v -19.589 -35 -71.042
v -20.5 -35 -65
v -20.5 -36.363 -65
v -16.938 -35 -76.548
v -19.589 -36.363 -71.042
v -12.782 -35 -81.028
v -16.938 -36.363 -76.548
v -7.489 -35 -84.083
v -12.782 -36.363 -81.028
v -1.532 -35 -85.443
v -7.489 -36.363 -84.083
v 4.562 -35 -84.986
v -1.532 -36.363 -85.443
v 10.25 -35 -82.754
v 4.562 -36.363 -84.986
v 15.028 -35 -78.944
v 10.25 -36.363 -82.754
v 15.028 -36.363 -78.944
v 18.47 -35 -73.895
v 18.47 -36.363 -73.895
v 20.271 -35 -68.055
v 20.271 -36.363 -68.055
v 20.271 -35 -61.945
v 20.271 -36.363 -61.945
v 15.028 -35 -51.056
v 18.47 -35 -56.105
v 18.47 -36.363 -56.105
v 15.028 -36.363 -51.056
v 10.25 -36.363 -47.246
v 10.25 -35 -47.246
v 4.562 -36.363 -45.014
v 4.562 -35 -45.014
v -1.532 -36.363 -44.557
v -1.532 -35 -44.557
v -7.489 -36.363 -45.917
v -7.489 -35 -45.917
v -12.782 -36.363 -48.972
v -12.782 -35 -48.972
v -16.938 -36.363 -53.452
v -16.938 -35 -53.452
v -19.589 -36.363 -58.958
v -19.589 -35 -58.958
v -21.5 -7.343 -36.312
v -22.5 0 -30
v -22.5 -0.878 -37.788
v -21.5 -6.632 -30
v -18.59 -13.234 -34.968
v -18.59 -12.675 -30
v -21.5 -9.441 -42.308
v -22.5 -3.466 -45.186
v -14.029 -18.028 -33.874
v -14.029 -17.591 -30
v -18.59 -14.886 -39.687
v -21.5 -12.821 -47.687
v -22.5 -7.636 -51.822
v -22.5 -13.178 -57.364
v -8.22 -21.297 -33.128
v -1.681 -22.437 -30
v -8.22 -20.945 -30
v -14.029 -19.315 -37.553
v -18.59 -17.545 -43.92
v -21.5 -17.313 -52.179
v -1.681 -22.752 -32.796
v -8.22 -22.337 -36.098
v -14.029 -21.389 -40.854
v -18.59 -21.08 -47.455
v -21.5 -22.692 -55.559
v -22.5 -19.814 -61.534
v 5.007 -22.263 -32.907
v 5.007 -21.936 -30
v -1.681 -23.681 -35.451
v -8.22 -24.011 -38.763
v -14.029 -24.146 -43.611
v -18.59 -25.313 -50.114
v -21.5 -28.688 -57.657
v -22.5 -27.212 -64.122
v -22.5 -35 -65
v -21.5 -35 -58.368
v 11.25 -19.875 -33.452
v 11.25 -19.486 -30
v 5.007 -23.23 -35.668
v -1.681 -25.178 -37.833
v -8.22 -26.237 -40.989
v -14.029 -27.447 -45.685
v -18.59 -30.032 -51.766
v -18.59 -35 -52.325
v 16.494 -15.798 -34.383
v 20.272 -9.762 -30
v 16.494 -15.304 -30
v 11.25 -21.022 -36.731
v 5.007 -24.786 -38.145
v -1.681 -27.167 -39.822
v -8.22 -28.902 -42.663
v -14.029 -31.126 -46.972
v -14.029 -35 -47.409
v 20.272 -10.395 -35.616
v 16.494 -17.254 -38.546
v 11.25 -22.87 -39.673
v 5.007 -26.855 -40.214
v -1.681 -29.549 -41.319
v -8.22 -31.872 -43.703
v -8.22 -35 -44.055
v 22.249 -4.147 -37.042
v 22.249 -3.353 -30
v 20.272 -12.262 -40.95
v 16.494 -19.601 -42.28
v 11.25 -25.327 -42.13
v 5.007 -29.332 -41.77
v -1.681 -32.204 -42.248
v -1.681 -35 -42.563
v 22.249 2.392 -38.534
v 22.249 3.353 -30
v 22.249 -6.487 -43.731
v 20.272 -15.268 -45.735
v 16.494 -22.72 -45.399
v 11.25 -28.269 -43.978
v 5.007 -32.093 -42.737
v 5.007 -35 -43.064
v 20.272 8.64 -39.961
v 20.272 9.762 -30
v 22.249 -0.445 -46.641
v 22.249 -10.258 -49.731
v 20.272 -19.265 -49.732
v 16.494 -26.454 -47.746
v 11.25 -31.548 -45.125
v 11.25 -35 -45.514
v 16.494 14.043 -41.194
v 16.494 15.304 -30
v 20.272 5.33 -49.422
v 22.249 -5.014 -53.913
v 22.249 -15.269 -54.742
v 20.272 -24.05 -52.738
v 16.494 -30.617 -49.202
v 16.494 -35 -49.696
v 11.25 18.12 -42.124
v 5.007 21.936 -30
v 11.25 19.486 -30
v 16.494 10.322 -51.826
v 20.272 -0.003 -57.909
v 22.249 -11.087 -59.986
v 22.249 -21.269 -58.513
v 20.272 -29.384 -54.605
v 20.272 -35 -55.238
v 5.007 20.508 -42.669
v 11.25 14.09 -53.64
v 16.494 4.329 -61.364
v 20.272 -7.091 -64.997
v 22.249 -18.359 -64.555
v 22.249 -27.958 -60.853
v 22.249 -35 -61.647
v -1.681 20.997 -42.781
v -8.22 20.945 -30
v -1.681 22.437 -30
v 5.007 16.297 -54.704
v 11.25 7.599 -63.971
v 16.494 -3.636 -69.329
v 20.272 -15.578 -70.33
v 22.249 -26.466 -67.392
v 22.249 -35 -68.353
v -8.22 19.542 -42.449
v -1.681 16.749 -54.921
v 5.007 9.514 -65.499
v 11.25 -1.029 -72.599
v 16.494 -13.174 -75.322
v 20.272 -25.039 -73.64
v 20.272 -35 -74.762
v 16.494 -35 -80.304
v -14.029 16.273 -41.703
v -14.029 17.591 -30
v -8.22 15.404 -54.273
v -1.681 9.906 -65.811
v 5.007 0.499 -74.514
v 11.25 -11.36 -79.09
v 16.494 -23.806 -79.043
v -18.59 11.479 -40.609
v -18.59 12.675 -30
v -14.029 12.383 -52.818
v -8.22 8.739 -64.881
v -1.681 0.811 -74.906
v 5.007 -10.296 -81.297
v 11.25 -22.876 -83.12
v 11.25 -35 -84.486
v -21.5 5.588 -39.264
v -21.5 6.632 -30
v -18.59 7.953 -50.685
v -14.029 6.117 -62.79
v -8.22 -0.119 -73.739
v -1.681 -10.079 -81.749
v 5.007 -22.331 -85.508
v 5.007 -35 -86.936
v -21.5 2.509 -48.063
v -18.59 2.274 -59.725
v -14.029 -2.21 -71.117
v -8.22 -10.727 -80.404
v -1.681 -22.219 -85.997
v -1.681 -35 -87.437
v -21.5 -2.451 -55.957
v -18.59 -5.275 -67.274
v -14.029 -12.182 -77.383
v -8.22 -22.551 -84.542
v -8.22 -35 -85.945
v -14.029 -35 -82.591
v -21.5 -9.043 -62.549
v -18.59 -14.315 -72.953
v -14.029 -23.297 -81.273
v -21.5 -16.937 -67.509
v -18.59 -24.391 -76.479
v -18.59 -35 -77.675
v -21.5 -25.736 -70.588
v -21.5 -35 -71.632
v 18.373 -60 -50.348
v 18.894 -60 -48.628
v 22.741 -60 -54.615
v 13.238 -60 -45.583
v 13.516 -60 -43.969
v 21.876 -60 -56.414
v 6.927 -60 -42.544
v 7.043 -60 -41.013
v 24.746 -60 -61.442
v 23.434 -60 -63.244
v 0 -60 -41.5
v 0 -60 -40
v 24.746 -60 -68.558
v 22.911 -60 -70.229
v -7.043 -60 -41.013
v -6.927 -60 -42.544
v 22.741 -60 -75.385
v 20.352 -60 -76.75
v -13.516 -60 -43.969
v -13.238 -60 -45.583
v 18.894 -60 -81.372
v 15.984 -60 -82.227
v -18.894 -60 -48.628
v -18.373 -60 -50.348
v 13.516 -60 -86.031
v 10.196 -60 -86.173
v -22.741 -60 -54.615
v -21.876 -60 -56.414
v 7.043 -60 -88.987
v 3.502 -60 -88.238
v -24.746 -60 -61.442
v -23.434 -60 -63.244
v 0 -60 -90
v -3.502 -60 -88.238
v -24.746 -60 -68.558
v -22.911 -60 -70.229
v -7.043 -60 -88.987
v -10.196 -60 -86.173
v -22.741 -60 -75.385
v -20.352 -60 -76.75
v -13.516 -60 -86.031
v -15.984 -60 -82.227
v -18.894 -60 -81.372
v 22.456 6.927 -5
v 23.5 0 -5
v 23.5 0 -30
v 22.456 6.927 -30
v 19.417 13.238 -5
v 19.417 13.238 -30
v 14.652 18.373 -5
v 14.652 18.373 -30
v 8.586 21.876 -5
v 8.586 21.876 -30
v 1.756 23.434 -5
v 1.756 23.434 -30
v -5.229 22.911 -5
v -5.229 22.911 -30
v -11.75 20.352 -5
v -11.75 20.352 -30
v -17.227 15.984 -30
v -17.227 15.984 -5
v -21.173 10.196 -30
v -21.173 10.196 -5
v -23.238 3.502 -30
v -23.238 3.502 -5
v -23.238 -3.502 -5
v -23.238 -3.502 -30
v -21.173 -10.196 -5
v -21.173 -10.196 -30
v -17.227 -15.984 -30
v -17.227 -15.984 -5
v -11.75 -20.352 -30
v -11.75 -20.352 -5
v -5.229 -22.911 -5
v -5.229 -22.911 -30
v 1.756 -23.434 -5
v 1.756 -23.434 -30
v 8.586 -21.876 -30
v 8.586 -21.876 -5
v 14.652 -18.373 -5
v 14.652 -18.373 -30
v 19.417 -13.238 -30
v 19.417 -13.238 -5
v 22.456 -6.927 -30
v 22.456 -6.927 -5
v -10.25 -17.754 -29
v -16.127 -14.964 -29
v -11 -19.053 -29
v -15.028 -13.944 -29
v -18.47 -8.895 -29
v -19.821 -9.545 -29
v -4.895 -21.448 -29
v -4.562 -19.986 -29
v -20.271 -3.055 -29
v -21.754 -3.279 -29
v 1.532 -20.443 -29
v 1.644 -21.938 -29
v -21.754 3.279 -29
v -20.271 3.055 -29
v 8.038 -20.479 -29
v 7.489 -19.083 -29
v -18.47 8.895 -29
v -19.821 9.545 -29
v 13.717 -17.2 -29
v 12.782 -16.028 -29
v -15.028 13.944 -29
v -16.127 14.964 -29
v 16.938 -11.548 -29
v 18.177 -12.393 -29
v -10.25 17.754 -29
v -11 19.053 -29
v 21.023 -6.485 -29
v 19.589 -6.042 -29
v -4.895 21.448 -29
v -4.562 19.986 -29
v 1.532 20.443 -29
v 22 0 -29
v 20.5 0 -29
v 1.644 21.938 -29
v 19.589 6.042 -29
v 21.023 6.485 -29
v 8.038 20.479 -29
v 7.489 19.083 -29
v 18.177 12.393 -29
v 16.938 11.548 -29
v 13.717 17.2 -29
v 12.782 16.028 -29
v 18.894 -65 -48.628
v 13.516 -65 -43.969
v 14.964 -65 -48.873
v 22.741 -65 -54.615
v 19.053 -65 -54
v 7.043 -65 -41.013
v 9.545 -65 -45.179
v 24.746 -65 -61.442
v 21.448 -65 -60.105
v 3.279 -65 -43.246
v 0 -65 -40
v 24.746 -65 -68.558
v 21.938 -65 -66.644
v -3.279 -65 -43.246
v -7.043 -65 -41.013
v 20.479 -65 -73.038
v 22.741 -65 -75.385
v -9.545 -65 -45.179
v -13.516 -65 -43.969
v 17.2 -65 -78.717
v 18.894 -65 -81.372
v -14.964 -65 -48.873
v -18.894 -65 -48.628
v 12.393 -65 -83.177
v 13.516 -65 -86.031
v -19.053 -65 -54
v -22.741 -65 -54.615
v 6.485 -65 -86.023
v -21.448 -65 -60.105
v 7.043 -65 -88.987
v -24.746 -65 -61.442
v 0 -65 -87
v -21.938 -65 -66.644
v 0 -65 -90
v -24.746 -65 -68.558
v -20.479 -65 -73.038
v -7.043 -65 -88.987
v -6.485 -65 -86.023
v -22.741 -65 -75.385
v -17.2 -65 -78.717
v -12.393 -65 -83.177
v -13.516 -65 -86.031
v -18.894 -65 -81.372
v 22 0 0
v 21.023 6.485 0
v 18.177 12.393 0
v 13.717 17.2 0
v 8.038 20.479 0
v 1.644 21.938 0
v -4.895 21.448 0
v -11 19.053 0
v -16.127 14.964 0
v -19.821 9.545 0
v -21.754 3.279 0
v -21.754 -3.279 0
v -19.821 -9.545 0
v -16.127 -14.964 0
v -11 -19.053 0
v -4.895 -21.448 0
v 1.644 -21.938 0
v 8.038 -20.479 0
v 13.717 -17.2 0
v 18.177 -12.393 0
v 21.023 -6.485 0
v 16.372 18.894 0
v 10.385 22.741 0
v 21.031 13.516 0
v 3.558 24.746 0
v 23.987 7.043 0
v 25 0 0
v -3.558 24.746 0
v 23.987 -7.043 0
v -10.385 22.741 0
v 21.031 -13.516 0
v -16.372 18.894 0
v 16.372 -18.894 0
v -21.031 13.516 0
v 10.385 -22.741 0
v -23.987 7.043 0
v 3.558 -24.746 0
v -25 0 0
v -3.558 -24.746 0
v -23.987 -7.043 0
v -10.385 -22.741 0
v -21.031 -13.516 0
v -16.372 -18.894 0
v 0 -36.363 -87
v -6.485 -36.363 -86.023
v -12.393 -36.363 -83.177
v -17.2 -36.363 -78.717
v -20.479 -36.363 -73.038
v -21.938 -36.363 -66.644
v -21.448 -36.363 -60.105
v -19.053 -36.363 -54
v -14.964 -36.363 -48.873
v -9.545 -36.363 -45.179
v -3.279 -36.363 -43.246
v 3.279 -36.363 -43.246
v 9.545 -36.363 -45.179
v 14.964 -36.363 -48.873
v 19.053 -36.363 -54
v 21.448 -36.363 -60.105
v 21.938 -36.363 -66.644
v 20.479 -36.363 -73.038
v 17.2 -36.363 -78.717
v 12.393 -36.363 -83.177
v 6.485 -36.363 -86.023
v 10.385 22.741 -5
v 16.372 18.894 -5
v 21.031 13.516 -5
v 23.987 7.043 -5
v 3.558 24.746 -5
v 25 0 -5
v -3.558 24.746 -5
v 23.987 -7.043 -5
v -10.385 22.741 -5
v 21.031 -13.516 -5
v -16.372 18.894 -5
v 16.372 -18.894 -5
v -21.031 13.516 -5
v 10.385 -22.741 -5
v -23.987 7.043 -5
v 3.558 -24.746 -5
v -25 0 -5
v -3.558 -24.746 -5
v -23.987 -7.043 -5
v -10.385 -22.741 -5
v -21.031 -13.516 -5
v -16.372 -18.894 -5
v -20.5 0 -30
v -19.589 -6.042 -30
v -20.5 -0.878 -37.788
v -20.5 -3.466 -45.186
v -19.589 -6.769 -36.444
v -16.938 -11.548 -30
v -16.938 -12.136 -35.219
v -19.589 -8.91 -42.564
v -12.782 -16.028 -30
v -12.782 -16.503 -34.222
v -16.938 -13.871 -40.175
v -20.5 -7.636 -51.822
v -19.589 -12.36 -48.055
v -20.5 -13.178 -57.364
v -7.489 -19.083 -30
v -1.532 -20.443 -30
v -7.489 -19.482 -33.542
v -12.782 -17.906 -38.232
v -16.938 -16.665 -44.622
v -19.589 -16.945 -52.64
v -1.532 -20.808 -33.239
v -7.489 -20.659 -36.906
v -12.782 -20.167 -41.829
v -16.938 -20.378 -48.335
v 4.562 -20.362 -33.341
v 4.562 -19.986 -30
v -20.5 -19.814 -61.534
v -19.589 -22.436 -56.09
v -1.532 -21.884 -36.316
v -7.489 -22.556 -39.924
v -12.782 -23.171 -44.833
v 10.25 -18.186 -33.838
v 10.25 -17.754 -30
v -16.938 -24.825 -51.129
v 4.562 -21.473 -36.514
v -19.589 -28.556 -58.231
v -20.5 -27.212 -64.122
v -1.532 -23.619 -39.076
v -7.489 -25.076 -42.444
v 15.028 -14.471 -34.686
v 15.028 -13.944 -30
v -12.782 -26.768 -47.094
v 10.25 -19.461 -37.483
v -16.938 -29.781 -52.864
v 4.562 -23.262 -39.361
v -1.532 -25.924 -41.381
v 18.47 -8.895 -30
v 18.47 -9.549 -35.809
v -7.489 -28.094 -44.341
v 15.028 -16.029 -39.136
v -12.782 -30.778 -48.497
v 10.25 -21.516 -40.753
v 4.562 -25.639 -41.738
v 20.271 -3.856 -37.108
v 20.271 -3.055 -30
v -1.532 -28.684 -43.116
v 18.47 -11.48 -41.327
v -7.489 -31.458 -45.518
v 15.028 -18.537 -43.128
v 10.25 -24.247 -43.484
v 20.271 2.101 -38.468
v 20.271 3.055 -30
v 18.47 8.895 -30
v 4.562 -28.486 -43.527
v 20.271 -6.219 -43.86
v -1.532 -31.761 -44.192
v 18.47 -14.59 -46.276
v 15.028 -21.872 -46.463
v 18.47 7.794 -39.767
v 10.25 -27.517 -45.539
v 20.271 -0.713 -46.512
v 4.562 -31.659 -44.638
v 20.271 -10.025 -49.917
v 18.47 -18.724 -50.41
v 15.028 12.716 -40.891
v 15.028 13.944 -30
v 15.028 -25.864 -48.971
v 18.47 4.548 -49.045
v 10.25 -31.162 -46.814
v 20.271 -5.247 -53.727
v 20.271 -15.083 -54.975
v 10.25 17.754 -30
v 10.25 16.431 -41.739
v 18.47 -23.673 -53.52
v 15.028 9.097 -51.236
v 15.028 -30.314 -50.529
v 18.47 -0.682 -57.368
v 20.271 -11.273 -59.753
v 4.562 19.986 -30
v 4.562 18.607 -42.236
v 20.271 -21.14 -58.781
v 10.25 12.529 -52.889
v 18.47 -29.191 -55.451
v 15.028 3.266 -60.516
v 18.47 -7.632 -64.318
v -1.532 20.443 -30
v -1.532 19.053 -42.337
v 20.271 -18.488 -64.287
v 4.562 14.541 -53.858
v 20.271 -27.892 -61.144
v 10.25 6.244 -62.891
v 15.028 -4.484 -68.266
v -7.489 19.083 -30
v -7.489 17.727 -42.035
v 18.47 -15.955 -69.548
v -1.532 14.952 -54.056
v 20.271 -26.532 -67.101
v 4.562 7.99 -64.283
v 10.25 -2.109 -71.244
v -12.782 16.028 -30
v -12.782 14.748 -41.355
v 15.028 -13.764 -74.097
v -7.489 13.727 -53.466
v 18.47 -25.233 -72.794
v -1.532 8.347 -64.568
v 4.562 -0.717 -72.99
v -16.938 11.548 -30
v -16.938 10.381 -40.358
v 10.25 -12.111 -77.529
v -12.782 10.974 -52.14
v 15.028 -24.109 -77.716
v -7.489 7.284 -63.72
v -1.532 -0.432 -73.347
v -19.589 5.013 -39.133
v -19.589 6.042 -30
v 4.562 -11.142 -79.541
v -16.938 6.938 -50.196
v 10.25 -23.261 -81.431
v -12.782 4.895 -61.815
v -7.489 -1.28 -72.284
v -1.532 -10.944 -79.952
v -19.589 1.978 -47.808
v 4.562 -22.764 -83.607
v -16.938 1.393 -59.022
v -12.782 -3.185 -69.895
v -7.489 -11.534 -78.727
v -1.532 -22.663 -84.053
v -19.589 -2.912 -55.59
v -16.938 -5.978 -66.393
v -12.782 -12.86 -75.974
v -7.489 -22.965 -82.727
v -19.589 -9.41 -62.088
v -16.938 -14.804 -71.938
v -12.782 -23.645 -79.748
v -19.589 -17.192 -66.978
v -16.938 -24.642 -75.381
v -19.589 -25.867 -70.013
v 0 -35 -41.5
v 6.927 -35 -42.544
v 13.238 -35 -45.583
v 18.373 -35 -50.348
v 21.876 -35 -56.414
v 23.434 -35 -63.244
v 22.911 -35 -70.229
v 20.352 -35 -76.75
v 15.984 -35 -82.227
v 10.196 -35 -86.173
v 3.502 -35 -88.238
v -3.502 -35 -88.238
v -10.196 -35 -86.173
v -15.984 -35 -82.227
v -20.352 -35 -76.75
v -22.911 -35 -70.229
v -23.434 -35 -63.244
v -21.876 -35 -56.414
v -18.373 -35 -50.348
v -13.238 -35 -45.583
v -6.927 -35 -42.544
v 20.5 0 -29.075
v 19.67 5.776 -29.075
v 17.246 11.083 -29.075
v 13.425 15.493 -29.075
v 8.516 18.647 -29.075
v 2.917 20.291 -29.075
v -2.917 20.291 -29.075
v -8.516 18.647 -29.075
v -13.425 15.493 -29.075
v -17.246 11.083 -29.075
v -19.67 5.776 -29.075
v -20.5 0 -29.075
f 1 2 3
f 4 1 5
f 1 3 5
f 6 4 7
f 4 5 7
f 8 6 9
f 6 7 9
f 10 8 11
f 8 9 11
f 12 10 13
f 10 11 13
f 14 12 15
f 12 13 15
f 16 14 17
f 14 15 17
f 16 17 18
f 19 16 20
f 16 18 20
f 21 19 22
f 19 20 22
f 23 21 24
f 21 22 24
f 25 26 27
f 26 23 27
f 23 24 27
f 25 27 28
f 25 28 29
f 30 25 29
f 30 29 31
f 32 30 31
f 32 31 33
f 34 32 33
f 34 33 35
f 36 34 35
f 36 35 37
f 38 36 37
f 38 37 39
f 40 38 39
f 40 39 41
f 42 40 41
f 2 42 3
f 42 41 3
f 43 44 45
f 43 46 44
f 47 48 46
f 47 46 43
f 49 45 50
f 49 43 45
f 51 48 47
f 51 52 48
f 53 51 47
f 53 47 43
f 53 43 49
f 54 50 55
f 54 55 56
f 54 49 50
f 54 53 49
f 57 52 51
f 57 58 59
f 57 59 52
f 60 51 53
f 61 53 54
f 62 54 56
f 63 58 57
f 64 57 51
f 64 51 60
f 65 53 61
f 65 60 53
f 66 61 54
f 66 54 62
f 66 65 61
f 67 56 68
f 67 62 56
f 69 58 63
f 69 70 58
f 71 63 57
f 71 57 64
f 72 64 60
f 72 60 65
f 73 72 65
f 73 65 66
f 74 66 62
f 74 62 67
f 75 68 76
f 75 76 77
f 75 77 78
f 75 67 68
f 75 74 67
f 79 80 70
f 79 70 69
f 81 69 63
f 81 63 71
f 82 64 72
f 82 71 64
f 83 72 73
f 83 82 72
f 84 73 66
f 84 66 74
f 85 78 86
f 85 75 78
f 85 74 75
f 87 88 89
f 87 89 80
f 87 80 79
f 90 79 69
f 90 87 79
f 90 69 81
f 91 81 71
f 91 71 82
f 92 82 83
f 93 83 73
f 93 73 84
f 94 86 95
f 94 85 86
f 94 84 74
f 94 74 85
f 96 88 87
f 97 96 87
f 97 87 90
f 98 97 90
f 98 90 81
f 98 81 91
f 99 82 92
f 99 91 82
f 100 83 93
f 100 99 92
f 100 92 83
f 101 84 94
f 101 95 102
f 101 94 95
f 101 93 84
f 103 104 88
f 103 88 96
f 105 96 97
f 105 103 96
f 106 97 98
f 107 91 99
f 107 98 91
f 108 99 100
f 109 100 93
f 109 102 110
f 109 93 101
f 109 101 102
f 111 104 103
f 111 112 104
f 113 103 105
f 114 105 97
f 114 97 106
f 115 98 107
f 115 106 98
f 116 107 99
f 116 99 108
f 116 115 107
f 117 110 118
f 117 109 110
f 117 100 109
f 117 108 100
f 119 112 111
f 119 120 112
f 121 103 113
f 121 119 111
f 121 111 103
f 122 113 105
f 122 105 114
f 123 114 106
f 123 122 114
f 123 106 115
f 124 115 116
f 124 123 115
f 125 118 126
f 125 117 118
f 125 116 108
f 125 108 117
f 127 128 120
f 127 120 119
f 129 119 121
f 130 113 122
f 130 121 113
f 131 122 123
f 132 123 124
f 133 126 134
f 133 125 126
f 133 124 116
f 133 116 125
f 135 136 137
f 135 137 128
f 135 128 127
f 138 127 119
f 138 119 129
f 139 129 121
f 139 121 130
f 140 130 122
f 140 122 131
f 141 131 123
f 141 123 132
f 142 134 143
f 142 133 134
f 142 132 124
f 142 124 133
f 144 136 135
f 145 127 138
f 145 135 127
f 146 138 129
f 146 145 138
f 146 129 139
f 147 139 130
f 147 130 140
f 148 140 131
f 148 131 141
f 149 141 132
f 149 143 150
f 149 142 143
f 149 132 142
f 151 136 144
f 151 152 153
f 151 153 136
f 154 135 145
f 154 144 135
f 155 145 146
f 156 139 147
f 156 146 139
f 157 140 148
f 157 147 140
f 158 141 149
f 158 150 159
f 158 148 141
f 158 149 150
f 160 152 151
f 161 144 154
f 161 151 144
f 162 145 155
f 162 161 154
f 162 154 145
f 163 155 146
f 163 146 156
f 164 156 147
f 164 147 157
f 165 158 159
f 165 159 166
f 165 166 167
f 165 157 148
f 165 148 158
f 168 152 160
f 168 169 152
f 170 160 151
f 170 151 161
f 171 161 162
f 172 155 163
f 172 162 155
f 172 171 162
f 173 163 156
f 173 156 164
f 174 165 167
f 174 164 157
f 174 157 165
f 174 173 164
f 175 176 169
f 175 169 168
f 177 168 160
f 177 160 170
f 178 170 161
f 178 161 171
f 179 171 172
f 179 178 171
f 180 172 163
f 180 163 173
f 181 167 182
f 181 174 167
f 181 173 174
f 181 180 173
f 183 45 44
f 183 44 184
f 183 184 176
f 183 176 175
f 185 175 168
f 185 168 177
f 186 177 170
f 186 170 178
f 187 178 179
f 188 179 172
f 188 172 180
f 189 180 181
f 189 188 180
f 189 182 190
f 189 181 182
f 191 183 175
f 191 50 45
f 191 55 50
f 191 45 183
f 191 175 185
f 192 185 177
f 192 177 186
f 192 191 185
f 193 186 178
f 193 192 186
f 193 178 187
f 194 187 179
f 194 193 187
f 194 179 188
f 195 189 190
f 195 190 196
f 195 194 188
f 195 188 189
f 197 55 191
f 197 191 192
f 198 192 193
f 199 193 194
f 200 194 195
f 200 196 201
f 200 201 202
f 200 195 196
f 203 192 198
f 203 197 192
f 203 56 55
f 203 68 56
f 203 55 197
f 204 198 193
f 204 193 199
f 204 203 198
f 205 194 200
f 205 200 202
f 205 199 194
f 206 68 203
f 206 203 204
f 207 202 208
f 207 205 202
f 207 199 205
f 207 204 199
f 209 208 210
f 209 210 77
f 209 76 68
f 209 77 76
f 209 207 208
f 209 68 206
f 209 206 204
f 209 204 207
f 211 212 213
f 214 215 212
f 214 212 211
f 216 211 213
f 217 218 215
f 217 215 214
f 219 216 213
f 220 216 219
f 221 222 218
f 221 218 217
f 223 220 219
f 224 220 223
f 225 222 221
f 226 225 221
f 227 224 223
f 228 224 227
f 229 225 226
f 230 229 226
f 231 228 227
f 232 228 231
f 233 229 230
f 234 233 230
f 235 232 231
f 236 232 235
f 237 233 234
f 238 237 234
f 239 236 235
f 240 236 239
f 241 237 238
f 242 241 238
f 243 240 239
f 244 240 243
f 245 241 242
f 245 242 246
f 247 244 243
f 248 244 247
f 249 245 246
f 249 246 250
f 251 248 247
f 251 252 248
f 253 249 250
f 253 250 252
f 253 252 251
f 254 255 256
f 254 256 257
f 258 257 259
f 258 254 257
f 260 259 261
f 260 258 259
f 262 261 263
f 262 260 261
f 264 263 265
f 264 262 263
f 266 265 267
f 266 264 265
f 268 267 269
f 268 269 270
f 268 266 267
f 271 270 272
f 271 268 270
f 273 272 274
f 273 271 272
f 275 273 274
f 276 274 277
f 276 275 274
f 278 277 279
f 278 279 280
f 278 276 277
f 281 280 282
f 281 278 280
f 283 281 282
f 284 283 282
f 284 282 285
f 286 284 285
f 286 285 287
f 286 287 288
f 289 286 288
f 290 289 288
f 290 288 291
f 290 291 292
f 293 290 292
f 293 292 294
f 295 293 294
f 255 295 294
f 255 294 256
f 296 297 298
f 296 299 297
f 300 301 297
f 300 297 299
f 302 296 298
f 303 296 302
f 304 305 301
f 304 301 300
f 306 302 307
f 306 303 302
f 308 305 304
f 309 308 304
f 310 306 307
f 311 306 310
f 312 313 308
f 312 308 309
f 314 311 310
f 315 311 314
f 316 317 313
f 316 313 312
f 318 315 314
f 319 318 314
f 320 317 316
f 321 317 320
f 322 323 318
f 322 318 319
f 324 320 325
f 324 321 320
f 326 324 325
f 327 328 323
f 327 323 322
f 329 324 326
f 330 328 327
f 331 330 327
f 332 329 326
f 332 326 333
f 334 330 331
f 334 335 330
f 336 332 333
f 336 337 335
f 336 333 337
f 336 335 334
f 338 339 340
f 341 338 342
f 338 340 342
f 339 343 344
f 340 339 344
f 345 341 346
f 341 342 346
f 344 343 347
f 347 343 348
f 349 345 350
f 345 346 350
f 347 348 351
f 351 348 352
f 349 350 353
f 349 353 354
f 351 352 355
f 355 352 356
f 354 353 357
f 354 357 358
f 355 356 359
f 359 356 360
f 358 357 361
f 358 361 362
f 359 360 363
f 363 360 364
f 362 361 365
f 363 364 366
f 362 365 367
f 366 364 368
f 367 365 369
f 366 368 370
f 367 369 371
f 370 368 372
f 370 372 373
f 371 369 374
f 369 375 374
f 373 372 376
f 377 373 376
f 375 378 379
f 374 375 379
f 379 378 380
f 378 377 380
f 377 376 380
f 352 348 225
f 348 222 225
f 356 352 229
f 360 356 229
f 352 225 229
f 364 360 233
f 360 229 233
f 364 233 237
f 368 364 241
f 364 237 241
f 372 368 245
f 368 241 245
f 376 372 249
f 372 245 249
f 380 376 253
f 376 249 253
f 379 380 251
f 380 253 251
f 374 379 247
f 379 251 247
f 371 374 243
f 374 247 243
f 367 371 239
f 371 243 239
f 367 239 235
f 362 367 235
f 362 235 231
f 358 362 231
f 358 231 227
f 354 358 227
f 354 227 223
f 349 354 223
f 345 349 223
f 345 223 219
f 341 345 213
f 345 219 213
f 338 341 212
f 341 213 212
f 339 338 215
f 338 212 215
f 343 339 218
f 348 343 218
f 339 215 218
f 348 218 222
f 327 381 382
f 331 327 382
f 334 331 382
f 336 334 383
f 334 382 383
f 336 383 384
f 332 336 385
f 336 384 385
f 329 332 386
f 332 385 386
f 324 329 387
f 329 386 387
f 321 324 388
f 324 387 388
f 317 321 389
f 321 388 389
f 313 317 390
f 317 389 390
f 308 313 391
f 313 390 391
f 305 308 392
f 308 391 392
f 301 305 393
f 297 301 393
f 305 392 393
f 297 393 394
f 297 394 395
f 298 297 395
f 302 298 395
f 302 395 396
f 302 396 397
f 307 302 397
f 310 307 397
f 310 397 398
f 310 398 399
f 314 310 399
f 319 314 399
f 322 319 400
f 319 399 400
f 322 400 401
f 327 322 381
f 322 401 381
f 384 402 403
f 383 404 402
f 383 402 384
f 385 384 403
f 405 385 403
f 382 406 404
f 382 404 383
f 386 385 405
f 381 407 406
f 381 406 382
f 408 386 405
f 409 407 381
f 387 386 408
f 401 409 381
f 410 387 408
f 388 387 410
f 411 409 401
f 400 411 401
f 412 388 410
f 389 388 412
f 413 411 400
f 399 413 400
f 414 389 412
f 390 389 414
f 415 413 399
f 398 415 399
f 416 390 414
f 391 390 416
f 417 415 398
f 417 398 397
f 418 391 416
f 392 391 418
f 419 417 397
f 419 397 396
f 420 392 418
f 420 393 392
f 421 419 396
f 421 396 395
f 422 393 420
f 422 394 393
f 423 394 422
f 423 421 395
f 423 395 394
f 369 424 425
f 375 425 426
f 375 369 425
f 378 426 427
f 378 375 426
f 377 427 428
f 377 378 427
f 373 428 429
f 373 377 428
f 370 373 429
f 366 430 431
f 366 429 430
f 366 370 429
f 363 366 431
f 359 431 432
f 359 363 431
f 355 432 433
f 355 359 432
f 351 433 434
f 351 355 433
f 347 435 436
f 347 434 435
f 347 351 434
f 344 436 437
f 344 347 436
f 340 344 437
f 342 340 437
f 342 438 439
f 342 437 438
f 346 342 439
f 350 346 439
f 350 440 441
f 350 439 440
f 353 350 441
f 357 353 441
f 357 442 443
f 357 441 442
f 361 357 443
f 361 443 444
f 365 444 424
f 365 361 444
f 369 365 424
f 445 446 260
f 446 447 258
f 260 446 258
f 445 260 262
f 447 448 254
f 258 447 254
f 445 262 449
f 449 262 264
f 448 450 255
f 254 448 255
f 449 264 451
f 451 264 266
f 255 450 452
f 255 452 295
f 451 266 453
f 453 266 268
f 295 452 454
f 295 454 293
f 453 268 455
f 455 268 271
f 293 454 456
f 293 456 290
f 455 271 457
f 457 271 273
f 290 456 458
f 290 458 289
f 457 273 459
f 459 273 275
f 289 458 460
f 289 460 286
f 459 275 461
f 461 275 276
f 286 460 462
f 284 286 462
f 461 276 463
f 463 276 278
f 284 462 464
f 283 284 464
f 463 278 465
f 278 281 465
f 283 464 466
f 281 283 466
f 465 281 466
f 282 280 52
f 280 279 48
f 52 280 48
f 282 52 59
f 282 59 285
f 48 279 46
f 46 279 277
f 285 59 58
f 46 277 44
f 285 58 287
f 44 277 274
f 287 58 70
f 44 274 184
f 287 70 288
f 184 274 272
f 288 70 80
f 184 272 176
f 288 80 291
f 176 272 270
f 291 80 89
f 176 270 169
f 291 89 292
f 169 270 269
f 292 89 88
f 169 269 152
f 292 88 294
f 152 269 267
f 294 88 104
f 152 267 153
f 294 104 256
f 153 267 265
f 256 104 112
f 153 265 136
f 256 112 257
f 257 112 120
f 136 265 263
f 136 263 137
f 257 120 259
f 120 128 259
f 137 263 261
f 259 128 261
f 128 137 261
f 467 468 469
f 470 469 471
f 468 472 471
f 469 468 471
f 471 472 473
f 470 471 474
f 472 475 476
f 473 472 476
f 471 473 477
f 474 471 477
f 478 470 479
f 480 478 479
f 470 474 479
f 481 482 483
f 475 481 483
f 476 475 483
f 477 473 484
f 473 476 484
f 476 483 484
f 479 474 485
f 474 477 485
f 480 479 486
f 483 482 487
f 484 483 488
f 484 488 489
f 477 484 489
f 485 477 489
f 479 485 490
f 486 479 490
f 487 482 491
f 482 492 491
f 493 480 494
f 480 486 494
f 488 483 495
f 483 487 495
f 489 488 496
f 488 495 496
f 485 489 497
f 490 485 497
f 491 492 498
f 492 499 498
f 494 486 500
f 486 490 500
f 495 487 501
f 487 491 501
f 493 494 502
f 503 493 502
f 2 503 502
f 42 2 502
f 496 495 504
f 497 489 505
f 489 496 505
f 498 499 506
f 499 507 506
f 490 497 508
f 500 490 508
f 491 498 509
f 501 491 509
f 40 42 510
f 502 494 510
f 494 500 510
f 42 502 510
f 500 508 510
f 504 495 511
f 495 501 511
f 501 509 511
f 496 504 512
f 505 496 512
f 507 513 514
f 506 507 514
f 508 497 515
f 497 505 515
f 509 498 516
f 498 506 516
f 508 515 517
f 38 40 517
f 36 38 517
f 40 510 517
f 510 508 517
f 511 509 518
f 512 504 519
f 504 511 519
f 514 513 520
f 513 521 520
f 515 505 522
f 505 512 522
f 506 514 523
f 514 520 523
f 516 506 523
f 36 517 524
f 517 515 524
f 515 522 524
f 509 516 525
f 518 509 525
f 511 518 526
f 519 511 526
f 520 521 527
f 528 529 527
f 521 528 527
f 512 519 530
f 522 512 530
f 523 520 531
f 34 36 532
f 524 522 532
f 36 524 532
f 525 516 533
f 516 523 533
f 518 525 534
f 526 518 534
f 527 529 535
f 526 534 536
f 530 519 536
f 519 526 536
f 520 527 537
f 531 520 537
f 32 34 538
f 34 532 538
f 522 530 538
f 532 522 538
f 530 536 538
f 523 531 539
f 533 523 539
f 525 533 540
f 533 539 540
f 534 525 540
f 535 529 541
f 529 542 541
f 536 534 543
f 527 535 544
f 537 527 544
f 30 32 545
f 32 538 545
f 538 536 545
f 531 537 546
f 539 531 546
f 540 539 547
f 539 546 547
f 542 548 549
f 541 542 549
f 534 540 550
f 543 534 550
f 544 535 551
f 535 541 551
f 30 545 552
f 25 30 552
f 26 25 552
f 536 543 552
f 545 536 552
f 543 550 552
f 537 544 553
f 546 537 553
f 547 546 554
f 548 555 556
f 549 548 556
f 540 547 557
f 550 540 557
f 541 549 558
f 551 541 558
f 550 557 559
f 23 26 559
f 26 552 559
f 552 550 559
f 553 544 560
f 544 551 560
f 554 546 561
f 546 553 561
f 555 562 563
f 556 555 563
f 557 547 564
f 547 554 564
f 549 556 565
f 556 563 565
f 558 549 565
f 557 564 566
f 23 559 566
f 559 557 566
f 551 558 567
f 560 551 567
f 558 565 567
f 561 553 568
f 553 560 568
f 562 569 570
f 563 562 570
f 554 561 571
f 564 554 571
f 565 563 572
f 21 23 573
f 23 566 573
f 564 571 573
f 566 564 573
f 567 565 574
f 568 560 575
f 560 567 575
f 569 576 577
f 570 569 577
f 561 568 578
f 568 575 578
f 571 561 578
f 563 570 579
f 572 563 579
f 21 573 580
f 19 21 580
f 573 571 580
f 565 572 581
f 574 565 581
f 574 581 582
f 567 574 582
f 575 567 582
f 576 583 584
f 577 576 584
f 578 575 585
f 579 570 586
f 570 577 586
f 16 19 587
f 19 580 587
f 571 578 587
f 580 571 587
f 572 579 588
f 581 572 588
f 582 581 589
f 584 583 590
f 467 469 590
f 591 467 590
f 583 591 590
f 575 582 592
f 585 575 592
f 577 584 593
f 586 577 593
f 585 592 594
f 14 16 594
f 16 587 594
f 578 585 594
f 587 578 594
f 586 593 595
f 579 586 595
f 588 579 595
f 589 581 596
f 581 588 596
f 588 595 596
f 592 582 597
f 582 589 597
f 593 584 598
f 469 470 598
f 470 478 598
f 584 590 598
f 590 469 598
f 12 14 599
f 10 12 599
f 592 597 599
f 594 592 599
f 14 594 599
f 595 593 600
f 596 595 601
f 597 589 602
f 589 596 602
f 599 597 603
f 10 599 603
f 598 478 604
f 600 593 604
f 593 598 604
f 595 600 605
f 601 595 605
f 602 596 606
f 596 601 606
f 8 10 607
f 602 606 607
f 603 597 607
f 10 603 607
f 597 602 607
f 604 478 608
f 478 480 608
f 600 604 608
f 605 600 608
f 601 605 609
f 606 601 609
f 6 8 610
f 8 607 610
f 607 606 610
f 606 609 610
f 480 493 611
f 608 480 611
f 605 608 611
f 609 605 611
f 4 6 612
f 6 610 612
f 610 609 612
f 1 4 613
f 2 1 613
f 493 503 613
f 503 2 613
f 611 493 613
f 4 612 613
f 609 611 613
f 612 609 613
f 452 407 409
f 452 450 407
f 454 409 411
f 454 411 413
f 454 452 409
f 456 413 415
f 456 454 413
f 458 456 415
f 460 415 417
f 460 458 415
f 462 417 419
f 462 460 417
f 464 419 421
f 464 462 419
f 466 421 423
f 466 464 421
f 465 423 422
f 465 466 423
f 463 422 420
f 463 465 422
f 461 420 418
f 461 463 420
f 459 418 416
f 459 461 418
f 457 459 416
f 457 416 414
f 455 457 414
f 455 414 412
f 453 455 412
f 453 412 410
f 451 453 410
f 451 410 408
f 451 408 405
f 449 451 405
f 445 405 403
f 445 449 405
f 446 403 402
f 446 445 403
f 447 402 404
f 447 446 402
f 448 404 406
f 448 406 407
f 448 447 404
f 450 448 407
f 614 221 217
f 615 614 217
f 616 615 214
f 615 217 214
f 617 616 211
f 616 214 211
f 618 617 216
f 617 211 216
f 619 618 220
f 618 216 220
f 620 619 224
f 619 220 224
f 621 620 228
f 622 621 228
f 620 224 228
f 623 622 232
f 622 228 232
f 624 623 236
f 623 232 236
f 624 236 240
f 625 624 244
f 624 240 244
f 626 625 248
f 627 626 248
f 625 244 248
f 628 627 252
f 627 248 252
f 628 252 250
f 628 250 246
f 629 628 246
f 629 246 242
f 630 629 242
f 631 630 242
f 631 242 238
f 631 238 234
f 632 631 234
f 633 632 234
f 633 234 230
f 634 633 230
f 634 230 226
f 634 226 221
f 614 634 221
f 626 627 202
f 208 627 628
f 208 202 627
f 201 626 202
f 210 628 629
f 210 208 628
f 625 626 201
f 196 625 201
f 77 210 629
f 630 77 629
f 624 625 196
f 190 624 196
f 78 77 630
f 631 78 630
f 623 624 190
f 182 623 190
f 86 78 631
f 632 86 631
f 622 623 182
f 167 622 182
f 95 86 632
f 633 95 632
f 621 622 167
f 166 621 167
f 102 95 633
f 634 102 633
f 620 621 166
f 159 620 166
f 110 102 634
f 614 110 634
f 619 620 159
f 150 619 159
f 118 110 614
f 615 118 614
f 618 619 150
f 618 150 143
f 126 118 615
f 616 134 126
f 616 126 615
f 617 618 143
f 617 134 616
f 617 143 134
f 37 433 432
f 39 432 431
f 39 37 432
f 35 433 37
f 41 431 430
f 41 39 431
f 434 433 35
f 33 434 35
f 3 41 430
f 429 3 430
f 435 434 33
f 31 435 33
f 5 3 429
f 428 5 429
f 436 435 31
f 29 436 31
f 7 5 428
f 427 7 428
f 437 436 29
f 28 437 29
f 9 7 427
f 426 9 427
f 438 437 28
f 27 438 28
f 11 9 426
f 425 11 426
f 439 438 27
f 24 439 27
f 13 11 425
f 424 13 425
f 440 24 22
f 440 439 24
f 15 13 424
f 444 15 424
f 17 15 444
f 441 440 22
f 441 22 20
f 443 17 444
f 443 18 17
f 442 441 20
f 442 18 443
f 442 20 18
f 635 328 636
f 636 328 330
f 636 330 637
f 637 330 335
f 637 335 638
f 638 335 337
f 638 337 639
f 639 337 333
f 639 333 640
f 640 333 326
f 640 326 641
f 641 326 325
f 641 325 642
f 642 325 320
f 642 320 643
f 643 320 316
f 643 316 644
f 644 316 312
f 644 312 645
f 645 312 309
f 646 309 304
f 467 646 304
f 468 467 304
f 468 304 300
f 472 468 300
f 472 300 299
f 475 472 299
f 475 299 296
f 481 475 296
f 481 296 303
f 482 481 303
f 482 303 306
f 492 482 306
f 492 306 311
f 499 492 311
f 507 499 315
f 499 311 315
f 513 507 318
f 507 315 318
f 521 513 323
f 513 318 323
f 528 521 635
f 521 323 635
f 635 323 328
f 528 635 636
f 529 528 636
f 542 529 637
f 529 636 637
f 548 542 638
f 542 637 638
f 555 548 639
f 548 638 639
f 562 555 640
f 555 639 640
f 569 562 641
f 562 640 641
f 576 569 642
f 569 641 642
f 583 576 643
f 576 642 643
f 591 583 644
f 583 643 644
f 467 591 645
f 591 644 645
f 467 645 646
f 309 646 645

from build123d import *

# Parameters (mm, degrees)
SKELETON_R           = 23.5
SKELETON_R_2         = 22
SKELETON_R_3         = 20.5
BOSS_EXTRUDE1_DEPTH  = 30
SKELETON_3_R         = 22
SKELETON_3_R_2       = 20.5
CUT_EXTRUDE1_DEPTH   = 29
BOSS_EXTRUDE3_START  = -65
SKETCH6_R            = 23.5
SKETCH6_R_2          = 20.5
BOSS_EXTRUDE3_DEPTH  = 30
CUT_EXTRUDE2_START   = -65
SKETCH6_5_R          = 22
CUT_EXTRUDE2_DEPTH   = 29
SWEEP1_PROFILE_R     = 22.5
CUT_SWEEP1_PROFILE_R = 20.5
SKETCH36_W           = 5
SKETCH36_H           = 1.5
SKETCH36_3_W         = 1.5
SKETCH36_3_H         = 5


with BuildPart() as part:
    # Skeleton → Boss-Extrude1 (new body)
    # profile 1 of 2: a face of its own
    with BuildSketch(Plane.XY):
        Circle(SKELETON_R)
        Circle(SKELETON_R_2, mode=Mode.SUBTRACT)
    # profile 2 of 2: a face of its own
    with BuildSketch(Plane.XY):
        Circle(SKELETON_R_2)
        Circle(SKELETON_R_3, mode=Mode.SUBTRACT)
    extrude(amount=-BOSS_EXTRUDE1_DEPTH)

    # Skeleton<3> → Cut-Extrude1 (cut)
    with BuildSketch(Plane.XY):
        Circle(SKELETON_3_R)
        Circle(SKELETON_3_R_2, mode=Mode.SUBTRACT)
    extrude(amount=-CUT_EXTRUDE1_DEPTH, mode=Mode.SUBTRACT)



with BuildPart() as body_2:
    # Sketch6 → Boss-Extrude3 (new body)
    with BuildSketch(Plane(origin=(0, 0, 0), x_dir=(1, 0, 0), z_dir=(0, 1, 0)).offset(BOSS_EXTRUDE3_START)):
        with Locations(Location((0, 65, 0), (0, 0, 270))):
            Circle(SKETCH6_R)
        with Locations(Location((0, 65, 0), (0, 0, 270))):
            Circle(SKETCH6_R_2, mode=Mode.SUBTRACT)
    extrude(amount=BOSS_EXTRUDE3_DEPTH)

    # Sketch6<5> → Cut-Extrude2 (cut)
    with BuildSketch(Plane(origin=(0, 0, 0), x_dir=(1, 0, 0), z_dir=(0, 1, 0)).offset(CUT_EXTRUDE2_START)):
        with Locations(Location((0, 65, 0), (0, 0, 90))):
            Circle(SKETCH6_5_R)
    extrude(amount=CUT_EXTRUDE2_DEPTH, mode=Mode.SUBTRACT)


with BuildPart() as part_1:
    add(part.part)

    add(body_2.part)  # Sweep1 merges body 2
    # Sweep1: sweep along a path in Sketch4
    with BuildLine(Plane(origin=(0, 0, 0), x_dir=(0, 0, -1), z_dir=(1, 0, 0))) as sweep1_path:
        Line((29.074908745, 0), (30, 0))
        ThreePointArc((30, 0), (54.748737342, -10.251262658), (65, -35))
        Line((65, -35), (65, -36.362694274))
    # Sweep1 profile (on start of the path) → Sweep1 (sweep)
    with BuildSketch(Plane(origin=(0, 0, -29.074908745), x_dir=(-1, 0, 0), z_dir=(0, 0, -1))):
        Circle(SWEEP1_PROFILE_R)
    sweep(path=sweep1_path.line)

    # Cut-Sweep1: sweep along a path in Sketch4<2>
    with BuildLine(Plane(origin=(0, 0, 0), x_dir=(0, 0, -1), z_dir=(1, 0, 0))) as cut_sweep1_path:
        Line((29.074908745, 0), (30, 0))
        ThreePointArc((30, 0), (54.748737342, -10.251262658), (65, -35))
        Line((65, -35), (65, -36.362694274))
    # Cut-Sweep1 profile (on start of the path) → Cut-Sweep1 (sweep, cut)
    with BuildSketch(Plane(origin=(0, 0, -29.074908745), x_dir=(-1, 0, 0), z_dir=(0, 0, -1))):
        Circle(CUT_SWEEP1_PROFILE_R)
    sweep(path=cut_sweep1_path.line, mode=Mode.SUBTRACT)

    # Sketch36 → Revolve1 (revolve)
    with BuildSketch(Plane(origin=(0, 0, 0), x_dir=(0, 0, -1), z_dir=(1, 0, 0)), mode=Mode.PRIVATE) as revolve1_sk:
        with Locations((2.5, 24.25)):
            Rectangle(SKETCH36_W, SKETCH36_H)
    revolve(revolve1_sk.sketch.rotate(Axis((0, 0, 0), (0, 0, -1)), 90), axis=Axis((0, 0, 0), (0, 0, -1)))

    # Sketch36<3> → Revolve2 (revolve)
    with BuildSketch(Plane(origin=(0, 0, 0), x_dir=(0, 0, -1), z_dir=(1, 0, 0)), mode=Mode.PRIVATE) as revolve2_sk:
        with Locations((89.25, -62.5)):
            Rectangle(SKETCH36_3_W, SKETCH36_3_H)
    revolve(revolve2_sk.sketch.rotate(Axis((0, 0, -65), (0, -1, 0)), 180), axis=Axis((0, 0, -65), (0, -1, 0)))


solid = part_1.part
